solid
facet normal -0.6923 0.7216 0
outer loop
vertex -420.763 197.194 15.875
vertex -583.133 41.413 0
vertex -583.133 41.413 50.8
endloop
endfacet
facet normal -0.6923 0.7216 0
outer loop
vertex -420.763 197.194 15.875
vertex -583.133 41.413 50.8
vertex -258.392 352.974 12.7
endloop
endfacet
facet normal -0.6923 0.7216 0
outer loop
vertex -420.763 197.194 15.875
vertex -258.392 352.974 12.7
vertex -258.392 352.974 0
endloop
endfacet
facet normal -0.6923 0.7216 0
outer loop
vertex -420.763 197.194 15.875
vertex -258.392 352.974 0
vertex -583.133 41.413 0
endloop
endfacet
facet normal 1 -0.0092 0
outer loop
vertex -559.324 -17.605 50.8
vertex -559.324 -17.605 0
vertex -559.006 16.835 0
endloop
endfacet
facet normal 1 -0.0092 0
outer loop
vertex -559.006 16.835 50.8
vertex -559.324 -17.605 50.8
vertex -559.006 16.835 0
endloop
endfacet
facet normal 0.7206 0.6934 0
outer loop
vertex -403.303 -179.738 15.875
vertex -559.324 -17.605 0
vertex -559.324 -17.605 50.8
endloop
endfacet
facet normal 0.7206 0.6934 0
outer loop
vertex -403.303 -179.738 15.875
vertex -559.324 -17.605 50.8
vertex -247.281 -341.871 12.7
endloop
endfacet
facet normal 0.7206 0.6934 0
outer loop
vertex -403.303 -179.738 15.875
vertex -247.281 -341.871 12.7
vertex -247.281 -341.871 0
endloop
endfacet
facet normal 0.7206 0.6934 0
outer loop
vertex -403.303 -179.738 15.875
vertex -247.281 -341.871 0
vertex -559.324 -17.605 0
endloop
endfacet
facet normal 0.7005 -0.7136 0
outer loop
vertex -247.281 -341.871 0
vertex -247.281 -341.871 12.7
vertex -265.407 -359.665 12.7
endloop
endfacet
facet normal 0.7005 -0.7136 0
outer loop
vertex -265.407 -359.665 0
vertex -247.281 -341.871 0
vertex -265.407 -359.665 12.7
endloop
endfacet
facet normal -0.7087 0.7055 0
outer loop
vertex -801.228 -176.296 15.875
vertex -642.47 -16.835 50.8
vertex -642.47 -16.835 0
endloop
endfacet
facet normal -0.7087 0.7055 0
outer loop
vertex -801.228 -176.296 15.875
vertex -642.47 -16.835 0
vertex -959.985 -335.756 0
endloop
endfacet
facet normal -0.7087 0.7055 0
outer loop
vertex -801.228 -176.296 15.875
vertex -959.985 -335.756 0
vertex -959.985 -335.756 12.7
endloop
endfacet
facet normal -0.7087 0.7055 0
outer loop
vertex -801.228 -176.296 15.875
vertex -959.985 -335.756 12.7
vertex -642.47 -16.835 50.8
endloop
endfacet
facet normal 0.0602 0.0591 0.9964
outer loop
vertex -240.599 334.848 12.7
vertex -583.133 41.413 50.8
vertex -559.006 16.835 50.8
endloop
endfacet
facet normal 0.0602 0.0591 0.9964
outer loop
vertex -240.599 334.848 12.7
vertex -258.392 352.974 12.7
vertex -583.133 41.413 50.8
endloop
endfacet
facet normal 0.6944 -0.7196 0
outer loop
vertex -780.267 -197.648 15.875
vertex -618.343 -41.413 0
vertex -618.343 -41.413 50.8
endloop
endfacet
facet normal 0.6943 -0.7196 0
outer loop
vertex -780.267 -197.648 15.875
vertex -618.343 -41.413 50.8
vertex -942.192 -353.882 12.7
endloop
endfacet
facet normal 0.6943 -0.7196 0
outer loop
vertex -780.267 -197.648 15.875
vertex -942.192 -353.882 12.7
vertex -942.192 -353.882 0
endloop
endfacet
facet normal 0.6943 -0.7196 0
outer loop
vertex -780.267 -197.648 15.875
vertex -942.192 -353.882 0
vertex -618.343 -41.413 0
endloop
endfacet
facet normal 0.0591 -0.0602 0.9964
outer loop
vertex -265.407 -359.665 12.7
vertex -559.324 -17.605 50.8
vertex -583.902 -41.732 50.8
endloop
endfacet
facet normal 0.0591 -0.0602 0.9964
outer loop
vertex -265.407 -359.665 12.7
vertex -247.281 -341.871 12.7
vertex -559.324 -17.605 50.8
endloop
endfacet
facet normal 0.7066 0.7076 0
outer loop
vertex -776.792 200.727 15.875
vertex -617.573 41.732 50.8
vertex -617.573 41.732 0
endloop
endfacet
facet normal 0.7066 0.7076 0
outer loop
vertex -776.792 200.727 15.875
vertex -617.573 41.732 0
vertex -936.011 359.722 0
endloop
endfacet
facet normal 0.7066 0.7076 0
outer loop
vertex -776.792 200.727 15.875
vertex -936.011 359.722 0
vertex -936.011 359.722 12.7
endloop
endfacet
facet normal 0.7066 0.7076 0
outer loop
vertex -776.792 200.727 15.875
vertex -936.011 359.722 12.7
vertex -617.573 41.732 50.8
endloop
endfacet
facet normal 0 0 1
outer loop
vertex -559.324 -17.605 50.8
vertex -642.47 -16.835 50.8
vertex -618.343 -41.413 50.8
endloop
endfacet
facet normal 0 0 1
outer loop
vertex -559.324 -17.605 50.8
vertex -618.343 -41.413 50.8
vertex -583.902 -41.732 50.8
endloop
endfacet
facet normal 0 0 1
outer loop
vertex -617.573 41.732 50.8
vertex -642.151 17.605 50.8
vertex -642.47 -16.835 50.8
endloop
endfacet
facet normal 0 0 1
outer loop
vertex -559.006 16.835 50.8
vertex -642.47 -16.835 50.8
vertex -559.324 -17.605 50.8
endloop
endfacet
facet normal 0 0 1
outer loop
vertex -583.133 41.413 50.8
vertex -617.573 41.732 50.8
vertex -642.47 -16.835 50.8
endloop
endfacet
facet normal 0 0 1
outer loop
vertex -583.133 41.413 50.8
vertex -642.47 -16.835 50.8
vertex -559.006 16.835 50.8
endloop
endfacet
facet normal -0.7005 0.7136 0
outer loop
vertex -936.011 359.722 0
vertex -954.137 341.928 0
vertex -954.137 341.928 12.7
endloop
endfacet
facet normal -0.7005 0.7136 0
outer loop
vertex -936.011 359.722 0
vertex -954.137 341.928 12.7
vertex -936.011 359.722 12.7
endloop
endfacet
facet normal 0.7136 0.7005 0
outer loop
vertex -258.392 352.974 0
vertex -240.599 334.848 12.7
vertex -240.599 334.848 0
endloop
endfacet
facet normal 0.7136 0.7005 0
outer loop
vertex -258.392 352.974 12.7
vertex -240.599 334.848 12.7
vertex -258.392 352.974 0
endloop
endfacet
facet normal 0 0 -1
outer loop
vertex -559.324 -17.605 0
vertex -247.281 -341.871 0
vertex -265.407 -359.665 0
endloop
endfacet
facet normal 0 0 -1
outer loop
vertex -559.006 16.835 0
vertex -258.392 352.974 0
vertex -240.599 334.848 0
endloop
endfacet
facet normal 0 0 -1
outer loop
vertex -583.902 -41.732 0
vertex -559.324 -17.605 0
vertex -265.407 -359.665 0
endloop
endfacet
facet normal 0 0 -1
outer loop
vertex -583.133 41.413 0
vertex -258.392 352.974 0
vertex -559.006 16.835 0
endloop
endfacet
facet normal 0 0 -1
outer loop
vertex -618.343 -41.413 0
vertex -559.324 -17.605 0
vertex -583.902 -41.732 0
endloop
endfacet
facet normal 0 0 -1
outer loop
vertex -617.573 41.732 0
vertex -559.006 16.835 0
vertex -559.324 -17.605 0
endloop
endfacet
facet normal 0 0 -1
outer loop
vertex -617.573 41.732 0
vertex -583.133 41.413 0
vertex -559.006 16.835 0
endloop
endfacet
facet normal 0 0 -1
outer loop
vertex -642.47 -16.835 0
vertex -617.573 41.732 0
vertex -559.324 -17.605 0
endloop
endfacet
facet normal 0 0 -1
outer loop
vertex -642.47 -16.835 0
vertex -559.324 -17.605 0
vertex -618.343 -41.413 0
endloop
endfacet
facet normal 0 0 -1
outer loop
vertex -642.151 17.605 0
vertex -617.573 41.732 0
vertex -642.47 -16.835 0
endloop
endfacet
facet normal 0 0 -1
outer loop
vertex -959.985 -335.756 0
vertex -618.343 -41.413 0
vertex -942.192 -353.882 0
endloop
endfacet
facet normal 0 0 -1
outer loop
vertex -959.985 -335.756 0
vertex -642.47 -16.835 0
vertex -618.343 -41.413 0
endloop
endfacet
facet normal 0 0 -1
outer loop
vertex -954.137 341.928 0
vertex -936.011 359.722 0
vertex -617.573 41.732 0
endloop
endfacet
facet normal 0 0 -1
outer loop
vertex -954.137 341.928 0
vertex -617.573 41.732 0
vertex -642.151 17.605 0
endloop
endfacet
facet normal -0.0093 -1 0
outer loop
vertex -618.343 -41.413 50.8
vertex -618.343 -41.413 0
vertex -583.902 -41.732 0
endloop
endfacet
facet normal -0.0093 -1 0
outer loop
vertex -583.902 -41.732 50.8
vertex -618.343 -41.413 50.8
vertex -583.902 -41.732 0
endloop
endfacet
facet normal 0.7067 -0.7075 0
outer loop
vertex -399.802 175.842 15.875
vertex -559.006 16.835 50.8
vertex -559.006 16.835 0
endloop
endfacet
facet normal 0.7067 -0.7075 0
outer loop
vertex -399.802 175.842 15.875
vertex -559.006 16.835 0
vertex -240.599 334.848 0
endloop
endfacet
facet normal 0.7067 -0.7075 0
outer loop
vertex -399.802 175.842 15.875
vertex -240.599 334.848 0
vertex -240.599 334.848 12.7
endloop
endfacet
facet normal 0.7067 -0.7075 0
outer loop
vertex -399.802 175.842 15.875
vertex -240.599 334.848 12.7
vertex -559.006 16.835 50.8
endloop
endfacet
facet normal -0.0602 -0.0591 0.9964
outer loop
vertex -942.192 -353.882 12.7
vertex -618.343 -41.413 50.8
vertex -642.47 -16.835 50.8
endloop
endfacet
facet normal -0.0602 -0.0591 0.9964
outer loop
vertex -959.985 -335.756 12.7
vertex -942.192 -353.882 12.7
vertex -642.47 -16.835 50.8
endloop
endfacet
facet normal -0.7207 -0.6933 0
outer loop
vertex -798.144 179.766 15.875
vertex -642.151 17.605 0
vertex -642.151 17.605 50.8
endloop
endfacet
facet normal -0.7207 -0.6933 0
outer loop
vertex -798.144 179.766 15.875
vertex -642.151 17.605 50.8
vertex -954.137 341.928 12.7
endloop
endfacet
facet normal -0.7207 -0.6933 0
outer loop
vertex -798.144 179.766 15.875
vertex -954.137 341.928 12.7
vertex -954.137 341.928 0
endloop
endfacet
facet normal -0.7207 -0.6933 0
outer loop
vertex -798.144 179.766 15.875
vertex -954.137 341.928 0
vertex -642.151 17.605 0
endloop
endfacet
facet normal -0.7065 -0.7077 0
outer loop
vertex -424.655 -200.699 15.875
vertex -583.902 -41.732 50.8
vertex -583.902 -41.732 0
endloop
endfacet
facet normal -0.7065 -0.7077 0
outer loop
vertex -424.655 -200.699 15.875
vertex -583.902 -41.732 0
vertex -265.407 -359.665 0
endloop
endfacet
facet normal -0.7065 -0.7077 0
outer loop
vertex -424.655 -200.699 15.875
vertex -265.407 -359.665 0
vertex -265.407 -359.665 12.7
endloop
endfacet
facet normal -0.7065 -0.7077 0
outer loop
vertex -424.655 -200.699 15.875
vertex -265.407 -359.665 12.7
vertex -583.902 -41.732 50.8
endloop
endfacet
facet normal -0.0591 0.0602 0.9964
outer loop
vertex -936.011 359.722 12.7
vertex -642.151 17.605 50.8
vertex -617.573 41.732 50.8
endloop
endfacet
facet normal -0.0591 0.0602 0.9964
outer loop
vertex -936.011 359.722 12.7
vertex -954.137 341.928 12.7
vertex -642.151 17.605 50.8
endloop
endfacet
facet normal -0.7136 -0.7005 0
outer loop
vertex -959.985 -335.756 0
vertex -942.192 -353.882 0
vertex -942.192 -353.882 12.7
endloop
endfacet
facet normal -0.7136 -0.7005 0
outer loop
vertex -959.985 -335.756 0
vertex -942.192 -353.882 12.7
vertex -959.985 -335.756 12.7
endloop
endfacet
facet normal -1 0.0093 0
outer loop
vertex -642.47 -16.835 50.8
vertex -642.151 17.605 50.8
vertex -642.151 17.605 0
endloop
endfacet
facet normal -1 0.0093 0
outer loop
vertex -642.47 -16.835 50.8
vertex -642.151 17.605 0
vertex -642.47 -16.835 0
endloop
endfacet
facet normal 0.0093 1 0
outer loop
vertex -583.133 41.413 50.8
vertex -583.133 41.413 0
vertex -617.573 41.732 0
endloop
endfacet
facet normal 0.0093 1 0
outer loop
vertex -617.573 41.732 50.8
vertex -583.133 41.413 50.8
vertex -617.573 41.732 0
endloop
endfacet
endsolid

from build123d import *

# Parameters (mm, degrees)
BOSS_EXTRUDE1_DEPTH = 50.8
SKETCH5_W           = 50.8
SKETCH5_H           = 34.441508913
SKETCH8_W           = 12.7
SKETCH8_H           = 25.4
SKETCH11_W          = 50.8
SKETCH11_H          = 34.441508913
SKETCH10_W          = 12.7
SKETCH10_H          = 25.4
SKETCH12_W          = 34.441508912
SKETCH12_H          = 50.8
SKETCH13_W          = 25.4
SKETCH13_H          = 12.7
SKETCH14_W          = 34.441508912
SKETCH14_H          = 50.8
SKETCH15_W          = 25.4
SKETCH15_H          = 12.7


with BuildPart() as part:
    # Sketch3 → Boss-Extrude1 (new body)
    with BuildSketch(Plane.XY):
        Polygon((-583.133216143, 41.413481842), (-617.573251094, 41.732117626), (-642.151342876, 17.604644891), (-642.469978659, -16.83539006), (-618.342505925, -41.413481842), (-583.902470973, -41.732117626), (-559.324379192, -17.604644891), (-559.005743408, 16.83539006), align=None)
    extrude(amount=BOSS_EXTRUDE1_DEPTH)

    # Sketch5 → Loft1 section 0
    with BuildSketch(Plane(origin=(-335.594803105, -329.44194911, 0), x_dir=(0, 0, 1), z_dir=(-0.713618322, -0.700534718, 0))):
        with Locations((25.4, 420.837728092)):
            Rectangle(SKETCH5_W, SKETCH5_H)
    # Sketch8 → Loft1 section 1
    with BuildSketch(Plane(origin=(-656.72304774, -644.682572171, 0), x_dir=(0, 0, 1), z_dir=(-0.713618322, -0.700534718, 0))):
        with Locations((6.35, 420.201309854)):
            Rectangle(SKETCH8_W, SKETCH8_H)
    loft()

    # Sketch11 → Loft2 section 0
    with BuildSketch(Plane(origin=(-276.258040589, -271.193077208, 0), x_dir=(0, 0, -1), z_dir=(0.713618322, 0.700534718, 0))):
        with Locations((-25.4, 420.837728092)):
            Rectangle(SKETCH11_W, SKETCH11_H)
    # Sketch10 → Loft2 section 1
    with BuildSketch(Plane(origin=(44.870204046, 44.047545853, 0), x_dir=(0, 0, -1), z_dir=(0.713618322, 0.700534718, 0))):
        with Locations((-6.35, 420.201309854)):
            Rectangle(SKETCH10_W, SKETCH10_H)
    loft()

    # Sketch12 → Loft3 section 0
    with BuildSketch(Plane(origin=(-265.687003236, 270.649131901, 0), x_dir=(-0.713618322, -0.700534718, 0), z_dir=(0.700534718, -0.713618322, 0))):
        with Locations((428.697544073, -25.4)):
            Rectangle(SKETCH12_W, SKETCH12_H)
    # Sketch13 → Loft3 section 1
    with BuildSketch(Plane(origin=(49.553619825, -50.479112734, 0), x_dir=(-0.713618322, -0.700534718, 0), z_dir=(0.700534718, -0.713618322, 0))):
        with Locations((428.656835586, -6.35)):
            Rectangle(SKETCH13_W, SKETCH13_H)
    loft()

    # Sketch14 → Loft4 section 0
    with BuildSketch(Plane(origin=(-323.935875138, 329.985894417, 0), x_dir=(0.713618322, 0.700534718, 0), z_dir=(-0.700534718, 0.713618322, 0))):
        with Locations((-428.697544073, -25.4)):
            Rectangle(SKETCH14_W, SKETCH14_H)
    # Sketch15 → Loft4 section 1
    with BuildSketch(Plane(origin=(-639.176498199, 651.114139052, 0), x_dir=(0.713618322, 0.700534718, 0), z_dir=(-0.700534718, 0.713618322, 0))):
        with Locations((-428.656835586, -6.35)):
            Rectangle(SKETCH15_W, SKETCH15_H)
    loft()


solid = part.part
